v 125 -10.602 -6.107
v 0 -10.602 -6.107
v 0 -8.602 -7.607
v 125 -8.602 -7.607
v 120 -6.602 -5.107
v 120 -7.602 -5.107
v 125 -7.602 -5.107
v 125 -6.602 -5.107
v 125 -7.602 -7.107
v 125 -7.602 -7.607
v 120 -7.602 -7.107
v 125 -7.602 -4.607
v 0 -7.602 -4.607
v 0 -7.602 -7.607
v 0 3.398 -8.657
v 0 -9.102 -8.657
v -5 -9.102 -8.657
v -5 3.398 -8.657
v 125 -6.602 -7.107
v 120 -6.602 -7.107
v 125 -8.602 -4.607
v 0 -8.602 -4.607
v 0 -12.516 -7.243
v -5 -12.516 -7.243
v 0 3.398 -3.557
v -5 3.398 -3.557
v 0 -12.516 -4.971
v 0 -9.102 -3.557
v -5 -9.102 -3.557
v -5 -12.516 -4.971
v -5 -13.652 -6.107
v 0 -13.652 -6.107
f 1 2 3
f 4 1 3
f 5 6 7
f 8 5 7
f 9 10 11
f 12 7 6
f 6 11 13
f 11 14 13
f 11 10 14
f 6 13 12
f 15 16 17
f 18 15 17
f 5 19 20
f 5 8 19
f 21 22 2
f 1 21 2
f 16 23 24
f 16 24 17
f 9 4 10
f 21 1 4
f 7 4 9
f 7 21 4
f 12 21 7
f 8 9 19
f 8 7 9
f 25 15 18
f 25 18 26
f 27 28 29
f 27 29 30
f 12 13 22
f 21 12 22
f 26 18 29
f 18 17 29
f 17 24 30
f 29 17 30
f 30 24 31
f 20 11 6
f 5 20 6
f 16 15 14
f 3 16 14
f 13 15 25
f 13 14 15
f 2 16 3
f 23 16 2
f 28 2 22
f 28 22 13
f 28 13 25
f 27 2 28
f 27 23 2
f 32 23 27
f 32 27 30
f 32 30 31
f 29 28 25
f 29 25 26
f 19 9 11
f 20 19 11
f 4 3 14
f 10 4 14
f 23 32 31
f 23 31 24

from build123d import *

# Parameters (mm, degrees)
F1_DEPTH = 125
F2_DEPTH = 5
F4_DEPTH = 1
F5_DEPTH = 10


with BuildPart() as f1:
    # F0 (on Right) → F1 (new body)
    with BuildSketch(Plane.YZ):
        Polygon((-8.6018808093, -7.6071059655), (-7.6018808093, -7.6071059655), (-7.6018808093, -4.6071059655), (-8.6018808093, -4.6071059655), (-10.6018808093, -6.1071059655), align=None)
    extrude(amount=F1_DEPTH)

    # F0 (on Right) → F2 (join)
    with BuildSketch(Plane.YZ):
        Polygon((-12.5160943717, -7.2428924032), (-9.1018808093, -8.6571059655), (-6.6018808093, -8.6571059655), (-6.6018808093, -3.5571059655), (-9.1018808093, -3.5571059655), (-12.5160943717, -4.9713195279), (-13.6518808093, -6.1071059655), align=None)
        Polygon((-7.6018808093, -4.6071059655), (-7.6018808093, -7.6071059655), (-8.6018808093, -7.6071059655), (-10.6018808093, -6.1071059655), (-8.6018808093, -4.6071059655), align=None, mode=Mode.SUBTRACT)
        Polygon((-8.6018808093, -7.6071059655), (-7.6018808093, -7.6071059655), (-7.6018808093, -4.6071059655), (-8.6018808093, -4.6071059655), (-10.6018808093, -6.1071059655), align=None)
    extrude(amount=-F2_DEPTH)

    # F3 (on face) → F4 (join)
    with BuildSketch(Plane(origin=(0, -7.6018808093, 0), x_dir=(-1, 0, 0), z_dir=(0, 1, 0))):
        Polygon((-125, -7.1071059655), (-120, -7.1071059655), (-120, -6.1071059655), (-120, -5.1071059655), (-125, -5.1071059655), align=None)
    extrude(amount=F4_DEPTH)

    # F5 (add): a face of the model
    f5_faces = [f1.faces().sort_by_distance(p)[0] for p in [
        (-2.5, -6.6018808093, -6.1071059655),
    ]]
    extrude(f5_faces, amount=F5_DEPTH)


solid = f1.part
